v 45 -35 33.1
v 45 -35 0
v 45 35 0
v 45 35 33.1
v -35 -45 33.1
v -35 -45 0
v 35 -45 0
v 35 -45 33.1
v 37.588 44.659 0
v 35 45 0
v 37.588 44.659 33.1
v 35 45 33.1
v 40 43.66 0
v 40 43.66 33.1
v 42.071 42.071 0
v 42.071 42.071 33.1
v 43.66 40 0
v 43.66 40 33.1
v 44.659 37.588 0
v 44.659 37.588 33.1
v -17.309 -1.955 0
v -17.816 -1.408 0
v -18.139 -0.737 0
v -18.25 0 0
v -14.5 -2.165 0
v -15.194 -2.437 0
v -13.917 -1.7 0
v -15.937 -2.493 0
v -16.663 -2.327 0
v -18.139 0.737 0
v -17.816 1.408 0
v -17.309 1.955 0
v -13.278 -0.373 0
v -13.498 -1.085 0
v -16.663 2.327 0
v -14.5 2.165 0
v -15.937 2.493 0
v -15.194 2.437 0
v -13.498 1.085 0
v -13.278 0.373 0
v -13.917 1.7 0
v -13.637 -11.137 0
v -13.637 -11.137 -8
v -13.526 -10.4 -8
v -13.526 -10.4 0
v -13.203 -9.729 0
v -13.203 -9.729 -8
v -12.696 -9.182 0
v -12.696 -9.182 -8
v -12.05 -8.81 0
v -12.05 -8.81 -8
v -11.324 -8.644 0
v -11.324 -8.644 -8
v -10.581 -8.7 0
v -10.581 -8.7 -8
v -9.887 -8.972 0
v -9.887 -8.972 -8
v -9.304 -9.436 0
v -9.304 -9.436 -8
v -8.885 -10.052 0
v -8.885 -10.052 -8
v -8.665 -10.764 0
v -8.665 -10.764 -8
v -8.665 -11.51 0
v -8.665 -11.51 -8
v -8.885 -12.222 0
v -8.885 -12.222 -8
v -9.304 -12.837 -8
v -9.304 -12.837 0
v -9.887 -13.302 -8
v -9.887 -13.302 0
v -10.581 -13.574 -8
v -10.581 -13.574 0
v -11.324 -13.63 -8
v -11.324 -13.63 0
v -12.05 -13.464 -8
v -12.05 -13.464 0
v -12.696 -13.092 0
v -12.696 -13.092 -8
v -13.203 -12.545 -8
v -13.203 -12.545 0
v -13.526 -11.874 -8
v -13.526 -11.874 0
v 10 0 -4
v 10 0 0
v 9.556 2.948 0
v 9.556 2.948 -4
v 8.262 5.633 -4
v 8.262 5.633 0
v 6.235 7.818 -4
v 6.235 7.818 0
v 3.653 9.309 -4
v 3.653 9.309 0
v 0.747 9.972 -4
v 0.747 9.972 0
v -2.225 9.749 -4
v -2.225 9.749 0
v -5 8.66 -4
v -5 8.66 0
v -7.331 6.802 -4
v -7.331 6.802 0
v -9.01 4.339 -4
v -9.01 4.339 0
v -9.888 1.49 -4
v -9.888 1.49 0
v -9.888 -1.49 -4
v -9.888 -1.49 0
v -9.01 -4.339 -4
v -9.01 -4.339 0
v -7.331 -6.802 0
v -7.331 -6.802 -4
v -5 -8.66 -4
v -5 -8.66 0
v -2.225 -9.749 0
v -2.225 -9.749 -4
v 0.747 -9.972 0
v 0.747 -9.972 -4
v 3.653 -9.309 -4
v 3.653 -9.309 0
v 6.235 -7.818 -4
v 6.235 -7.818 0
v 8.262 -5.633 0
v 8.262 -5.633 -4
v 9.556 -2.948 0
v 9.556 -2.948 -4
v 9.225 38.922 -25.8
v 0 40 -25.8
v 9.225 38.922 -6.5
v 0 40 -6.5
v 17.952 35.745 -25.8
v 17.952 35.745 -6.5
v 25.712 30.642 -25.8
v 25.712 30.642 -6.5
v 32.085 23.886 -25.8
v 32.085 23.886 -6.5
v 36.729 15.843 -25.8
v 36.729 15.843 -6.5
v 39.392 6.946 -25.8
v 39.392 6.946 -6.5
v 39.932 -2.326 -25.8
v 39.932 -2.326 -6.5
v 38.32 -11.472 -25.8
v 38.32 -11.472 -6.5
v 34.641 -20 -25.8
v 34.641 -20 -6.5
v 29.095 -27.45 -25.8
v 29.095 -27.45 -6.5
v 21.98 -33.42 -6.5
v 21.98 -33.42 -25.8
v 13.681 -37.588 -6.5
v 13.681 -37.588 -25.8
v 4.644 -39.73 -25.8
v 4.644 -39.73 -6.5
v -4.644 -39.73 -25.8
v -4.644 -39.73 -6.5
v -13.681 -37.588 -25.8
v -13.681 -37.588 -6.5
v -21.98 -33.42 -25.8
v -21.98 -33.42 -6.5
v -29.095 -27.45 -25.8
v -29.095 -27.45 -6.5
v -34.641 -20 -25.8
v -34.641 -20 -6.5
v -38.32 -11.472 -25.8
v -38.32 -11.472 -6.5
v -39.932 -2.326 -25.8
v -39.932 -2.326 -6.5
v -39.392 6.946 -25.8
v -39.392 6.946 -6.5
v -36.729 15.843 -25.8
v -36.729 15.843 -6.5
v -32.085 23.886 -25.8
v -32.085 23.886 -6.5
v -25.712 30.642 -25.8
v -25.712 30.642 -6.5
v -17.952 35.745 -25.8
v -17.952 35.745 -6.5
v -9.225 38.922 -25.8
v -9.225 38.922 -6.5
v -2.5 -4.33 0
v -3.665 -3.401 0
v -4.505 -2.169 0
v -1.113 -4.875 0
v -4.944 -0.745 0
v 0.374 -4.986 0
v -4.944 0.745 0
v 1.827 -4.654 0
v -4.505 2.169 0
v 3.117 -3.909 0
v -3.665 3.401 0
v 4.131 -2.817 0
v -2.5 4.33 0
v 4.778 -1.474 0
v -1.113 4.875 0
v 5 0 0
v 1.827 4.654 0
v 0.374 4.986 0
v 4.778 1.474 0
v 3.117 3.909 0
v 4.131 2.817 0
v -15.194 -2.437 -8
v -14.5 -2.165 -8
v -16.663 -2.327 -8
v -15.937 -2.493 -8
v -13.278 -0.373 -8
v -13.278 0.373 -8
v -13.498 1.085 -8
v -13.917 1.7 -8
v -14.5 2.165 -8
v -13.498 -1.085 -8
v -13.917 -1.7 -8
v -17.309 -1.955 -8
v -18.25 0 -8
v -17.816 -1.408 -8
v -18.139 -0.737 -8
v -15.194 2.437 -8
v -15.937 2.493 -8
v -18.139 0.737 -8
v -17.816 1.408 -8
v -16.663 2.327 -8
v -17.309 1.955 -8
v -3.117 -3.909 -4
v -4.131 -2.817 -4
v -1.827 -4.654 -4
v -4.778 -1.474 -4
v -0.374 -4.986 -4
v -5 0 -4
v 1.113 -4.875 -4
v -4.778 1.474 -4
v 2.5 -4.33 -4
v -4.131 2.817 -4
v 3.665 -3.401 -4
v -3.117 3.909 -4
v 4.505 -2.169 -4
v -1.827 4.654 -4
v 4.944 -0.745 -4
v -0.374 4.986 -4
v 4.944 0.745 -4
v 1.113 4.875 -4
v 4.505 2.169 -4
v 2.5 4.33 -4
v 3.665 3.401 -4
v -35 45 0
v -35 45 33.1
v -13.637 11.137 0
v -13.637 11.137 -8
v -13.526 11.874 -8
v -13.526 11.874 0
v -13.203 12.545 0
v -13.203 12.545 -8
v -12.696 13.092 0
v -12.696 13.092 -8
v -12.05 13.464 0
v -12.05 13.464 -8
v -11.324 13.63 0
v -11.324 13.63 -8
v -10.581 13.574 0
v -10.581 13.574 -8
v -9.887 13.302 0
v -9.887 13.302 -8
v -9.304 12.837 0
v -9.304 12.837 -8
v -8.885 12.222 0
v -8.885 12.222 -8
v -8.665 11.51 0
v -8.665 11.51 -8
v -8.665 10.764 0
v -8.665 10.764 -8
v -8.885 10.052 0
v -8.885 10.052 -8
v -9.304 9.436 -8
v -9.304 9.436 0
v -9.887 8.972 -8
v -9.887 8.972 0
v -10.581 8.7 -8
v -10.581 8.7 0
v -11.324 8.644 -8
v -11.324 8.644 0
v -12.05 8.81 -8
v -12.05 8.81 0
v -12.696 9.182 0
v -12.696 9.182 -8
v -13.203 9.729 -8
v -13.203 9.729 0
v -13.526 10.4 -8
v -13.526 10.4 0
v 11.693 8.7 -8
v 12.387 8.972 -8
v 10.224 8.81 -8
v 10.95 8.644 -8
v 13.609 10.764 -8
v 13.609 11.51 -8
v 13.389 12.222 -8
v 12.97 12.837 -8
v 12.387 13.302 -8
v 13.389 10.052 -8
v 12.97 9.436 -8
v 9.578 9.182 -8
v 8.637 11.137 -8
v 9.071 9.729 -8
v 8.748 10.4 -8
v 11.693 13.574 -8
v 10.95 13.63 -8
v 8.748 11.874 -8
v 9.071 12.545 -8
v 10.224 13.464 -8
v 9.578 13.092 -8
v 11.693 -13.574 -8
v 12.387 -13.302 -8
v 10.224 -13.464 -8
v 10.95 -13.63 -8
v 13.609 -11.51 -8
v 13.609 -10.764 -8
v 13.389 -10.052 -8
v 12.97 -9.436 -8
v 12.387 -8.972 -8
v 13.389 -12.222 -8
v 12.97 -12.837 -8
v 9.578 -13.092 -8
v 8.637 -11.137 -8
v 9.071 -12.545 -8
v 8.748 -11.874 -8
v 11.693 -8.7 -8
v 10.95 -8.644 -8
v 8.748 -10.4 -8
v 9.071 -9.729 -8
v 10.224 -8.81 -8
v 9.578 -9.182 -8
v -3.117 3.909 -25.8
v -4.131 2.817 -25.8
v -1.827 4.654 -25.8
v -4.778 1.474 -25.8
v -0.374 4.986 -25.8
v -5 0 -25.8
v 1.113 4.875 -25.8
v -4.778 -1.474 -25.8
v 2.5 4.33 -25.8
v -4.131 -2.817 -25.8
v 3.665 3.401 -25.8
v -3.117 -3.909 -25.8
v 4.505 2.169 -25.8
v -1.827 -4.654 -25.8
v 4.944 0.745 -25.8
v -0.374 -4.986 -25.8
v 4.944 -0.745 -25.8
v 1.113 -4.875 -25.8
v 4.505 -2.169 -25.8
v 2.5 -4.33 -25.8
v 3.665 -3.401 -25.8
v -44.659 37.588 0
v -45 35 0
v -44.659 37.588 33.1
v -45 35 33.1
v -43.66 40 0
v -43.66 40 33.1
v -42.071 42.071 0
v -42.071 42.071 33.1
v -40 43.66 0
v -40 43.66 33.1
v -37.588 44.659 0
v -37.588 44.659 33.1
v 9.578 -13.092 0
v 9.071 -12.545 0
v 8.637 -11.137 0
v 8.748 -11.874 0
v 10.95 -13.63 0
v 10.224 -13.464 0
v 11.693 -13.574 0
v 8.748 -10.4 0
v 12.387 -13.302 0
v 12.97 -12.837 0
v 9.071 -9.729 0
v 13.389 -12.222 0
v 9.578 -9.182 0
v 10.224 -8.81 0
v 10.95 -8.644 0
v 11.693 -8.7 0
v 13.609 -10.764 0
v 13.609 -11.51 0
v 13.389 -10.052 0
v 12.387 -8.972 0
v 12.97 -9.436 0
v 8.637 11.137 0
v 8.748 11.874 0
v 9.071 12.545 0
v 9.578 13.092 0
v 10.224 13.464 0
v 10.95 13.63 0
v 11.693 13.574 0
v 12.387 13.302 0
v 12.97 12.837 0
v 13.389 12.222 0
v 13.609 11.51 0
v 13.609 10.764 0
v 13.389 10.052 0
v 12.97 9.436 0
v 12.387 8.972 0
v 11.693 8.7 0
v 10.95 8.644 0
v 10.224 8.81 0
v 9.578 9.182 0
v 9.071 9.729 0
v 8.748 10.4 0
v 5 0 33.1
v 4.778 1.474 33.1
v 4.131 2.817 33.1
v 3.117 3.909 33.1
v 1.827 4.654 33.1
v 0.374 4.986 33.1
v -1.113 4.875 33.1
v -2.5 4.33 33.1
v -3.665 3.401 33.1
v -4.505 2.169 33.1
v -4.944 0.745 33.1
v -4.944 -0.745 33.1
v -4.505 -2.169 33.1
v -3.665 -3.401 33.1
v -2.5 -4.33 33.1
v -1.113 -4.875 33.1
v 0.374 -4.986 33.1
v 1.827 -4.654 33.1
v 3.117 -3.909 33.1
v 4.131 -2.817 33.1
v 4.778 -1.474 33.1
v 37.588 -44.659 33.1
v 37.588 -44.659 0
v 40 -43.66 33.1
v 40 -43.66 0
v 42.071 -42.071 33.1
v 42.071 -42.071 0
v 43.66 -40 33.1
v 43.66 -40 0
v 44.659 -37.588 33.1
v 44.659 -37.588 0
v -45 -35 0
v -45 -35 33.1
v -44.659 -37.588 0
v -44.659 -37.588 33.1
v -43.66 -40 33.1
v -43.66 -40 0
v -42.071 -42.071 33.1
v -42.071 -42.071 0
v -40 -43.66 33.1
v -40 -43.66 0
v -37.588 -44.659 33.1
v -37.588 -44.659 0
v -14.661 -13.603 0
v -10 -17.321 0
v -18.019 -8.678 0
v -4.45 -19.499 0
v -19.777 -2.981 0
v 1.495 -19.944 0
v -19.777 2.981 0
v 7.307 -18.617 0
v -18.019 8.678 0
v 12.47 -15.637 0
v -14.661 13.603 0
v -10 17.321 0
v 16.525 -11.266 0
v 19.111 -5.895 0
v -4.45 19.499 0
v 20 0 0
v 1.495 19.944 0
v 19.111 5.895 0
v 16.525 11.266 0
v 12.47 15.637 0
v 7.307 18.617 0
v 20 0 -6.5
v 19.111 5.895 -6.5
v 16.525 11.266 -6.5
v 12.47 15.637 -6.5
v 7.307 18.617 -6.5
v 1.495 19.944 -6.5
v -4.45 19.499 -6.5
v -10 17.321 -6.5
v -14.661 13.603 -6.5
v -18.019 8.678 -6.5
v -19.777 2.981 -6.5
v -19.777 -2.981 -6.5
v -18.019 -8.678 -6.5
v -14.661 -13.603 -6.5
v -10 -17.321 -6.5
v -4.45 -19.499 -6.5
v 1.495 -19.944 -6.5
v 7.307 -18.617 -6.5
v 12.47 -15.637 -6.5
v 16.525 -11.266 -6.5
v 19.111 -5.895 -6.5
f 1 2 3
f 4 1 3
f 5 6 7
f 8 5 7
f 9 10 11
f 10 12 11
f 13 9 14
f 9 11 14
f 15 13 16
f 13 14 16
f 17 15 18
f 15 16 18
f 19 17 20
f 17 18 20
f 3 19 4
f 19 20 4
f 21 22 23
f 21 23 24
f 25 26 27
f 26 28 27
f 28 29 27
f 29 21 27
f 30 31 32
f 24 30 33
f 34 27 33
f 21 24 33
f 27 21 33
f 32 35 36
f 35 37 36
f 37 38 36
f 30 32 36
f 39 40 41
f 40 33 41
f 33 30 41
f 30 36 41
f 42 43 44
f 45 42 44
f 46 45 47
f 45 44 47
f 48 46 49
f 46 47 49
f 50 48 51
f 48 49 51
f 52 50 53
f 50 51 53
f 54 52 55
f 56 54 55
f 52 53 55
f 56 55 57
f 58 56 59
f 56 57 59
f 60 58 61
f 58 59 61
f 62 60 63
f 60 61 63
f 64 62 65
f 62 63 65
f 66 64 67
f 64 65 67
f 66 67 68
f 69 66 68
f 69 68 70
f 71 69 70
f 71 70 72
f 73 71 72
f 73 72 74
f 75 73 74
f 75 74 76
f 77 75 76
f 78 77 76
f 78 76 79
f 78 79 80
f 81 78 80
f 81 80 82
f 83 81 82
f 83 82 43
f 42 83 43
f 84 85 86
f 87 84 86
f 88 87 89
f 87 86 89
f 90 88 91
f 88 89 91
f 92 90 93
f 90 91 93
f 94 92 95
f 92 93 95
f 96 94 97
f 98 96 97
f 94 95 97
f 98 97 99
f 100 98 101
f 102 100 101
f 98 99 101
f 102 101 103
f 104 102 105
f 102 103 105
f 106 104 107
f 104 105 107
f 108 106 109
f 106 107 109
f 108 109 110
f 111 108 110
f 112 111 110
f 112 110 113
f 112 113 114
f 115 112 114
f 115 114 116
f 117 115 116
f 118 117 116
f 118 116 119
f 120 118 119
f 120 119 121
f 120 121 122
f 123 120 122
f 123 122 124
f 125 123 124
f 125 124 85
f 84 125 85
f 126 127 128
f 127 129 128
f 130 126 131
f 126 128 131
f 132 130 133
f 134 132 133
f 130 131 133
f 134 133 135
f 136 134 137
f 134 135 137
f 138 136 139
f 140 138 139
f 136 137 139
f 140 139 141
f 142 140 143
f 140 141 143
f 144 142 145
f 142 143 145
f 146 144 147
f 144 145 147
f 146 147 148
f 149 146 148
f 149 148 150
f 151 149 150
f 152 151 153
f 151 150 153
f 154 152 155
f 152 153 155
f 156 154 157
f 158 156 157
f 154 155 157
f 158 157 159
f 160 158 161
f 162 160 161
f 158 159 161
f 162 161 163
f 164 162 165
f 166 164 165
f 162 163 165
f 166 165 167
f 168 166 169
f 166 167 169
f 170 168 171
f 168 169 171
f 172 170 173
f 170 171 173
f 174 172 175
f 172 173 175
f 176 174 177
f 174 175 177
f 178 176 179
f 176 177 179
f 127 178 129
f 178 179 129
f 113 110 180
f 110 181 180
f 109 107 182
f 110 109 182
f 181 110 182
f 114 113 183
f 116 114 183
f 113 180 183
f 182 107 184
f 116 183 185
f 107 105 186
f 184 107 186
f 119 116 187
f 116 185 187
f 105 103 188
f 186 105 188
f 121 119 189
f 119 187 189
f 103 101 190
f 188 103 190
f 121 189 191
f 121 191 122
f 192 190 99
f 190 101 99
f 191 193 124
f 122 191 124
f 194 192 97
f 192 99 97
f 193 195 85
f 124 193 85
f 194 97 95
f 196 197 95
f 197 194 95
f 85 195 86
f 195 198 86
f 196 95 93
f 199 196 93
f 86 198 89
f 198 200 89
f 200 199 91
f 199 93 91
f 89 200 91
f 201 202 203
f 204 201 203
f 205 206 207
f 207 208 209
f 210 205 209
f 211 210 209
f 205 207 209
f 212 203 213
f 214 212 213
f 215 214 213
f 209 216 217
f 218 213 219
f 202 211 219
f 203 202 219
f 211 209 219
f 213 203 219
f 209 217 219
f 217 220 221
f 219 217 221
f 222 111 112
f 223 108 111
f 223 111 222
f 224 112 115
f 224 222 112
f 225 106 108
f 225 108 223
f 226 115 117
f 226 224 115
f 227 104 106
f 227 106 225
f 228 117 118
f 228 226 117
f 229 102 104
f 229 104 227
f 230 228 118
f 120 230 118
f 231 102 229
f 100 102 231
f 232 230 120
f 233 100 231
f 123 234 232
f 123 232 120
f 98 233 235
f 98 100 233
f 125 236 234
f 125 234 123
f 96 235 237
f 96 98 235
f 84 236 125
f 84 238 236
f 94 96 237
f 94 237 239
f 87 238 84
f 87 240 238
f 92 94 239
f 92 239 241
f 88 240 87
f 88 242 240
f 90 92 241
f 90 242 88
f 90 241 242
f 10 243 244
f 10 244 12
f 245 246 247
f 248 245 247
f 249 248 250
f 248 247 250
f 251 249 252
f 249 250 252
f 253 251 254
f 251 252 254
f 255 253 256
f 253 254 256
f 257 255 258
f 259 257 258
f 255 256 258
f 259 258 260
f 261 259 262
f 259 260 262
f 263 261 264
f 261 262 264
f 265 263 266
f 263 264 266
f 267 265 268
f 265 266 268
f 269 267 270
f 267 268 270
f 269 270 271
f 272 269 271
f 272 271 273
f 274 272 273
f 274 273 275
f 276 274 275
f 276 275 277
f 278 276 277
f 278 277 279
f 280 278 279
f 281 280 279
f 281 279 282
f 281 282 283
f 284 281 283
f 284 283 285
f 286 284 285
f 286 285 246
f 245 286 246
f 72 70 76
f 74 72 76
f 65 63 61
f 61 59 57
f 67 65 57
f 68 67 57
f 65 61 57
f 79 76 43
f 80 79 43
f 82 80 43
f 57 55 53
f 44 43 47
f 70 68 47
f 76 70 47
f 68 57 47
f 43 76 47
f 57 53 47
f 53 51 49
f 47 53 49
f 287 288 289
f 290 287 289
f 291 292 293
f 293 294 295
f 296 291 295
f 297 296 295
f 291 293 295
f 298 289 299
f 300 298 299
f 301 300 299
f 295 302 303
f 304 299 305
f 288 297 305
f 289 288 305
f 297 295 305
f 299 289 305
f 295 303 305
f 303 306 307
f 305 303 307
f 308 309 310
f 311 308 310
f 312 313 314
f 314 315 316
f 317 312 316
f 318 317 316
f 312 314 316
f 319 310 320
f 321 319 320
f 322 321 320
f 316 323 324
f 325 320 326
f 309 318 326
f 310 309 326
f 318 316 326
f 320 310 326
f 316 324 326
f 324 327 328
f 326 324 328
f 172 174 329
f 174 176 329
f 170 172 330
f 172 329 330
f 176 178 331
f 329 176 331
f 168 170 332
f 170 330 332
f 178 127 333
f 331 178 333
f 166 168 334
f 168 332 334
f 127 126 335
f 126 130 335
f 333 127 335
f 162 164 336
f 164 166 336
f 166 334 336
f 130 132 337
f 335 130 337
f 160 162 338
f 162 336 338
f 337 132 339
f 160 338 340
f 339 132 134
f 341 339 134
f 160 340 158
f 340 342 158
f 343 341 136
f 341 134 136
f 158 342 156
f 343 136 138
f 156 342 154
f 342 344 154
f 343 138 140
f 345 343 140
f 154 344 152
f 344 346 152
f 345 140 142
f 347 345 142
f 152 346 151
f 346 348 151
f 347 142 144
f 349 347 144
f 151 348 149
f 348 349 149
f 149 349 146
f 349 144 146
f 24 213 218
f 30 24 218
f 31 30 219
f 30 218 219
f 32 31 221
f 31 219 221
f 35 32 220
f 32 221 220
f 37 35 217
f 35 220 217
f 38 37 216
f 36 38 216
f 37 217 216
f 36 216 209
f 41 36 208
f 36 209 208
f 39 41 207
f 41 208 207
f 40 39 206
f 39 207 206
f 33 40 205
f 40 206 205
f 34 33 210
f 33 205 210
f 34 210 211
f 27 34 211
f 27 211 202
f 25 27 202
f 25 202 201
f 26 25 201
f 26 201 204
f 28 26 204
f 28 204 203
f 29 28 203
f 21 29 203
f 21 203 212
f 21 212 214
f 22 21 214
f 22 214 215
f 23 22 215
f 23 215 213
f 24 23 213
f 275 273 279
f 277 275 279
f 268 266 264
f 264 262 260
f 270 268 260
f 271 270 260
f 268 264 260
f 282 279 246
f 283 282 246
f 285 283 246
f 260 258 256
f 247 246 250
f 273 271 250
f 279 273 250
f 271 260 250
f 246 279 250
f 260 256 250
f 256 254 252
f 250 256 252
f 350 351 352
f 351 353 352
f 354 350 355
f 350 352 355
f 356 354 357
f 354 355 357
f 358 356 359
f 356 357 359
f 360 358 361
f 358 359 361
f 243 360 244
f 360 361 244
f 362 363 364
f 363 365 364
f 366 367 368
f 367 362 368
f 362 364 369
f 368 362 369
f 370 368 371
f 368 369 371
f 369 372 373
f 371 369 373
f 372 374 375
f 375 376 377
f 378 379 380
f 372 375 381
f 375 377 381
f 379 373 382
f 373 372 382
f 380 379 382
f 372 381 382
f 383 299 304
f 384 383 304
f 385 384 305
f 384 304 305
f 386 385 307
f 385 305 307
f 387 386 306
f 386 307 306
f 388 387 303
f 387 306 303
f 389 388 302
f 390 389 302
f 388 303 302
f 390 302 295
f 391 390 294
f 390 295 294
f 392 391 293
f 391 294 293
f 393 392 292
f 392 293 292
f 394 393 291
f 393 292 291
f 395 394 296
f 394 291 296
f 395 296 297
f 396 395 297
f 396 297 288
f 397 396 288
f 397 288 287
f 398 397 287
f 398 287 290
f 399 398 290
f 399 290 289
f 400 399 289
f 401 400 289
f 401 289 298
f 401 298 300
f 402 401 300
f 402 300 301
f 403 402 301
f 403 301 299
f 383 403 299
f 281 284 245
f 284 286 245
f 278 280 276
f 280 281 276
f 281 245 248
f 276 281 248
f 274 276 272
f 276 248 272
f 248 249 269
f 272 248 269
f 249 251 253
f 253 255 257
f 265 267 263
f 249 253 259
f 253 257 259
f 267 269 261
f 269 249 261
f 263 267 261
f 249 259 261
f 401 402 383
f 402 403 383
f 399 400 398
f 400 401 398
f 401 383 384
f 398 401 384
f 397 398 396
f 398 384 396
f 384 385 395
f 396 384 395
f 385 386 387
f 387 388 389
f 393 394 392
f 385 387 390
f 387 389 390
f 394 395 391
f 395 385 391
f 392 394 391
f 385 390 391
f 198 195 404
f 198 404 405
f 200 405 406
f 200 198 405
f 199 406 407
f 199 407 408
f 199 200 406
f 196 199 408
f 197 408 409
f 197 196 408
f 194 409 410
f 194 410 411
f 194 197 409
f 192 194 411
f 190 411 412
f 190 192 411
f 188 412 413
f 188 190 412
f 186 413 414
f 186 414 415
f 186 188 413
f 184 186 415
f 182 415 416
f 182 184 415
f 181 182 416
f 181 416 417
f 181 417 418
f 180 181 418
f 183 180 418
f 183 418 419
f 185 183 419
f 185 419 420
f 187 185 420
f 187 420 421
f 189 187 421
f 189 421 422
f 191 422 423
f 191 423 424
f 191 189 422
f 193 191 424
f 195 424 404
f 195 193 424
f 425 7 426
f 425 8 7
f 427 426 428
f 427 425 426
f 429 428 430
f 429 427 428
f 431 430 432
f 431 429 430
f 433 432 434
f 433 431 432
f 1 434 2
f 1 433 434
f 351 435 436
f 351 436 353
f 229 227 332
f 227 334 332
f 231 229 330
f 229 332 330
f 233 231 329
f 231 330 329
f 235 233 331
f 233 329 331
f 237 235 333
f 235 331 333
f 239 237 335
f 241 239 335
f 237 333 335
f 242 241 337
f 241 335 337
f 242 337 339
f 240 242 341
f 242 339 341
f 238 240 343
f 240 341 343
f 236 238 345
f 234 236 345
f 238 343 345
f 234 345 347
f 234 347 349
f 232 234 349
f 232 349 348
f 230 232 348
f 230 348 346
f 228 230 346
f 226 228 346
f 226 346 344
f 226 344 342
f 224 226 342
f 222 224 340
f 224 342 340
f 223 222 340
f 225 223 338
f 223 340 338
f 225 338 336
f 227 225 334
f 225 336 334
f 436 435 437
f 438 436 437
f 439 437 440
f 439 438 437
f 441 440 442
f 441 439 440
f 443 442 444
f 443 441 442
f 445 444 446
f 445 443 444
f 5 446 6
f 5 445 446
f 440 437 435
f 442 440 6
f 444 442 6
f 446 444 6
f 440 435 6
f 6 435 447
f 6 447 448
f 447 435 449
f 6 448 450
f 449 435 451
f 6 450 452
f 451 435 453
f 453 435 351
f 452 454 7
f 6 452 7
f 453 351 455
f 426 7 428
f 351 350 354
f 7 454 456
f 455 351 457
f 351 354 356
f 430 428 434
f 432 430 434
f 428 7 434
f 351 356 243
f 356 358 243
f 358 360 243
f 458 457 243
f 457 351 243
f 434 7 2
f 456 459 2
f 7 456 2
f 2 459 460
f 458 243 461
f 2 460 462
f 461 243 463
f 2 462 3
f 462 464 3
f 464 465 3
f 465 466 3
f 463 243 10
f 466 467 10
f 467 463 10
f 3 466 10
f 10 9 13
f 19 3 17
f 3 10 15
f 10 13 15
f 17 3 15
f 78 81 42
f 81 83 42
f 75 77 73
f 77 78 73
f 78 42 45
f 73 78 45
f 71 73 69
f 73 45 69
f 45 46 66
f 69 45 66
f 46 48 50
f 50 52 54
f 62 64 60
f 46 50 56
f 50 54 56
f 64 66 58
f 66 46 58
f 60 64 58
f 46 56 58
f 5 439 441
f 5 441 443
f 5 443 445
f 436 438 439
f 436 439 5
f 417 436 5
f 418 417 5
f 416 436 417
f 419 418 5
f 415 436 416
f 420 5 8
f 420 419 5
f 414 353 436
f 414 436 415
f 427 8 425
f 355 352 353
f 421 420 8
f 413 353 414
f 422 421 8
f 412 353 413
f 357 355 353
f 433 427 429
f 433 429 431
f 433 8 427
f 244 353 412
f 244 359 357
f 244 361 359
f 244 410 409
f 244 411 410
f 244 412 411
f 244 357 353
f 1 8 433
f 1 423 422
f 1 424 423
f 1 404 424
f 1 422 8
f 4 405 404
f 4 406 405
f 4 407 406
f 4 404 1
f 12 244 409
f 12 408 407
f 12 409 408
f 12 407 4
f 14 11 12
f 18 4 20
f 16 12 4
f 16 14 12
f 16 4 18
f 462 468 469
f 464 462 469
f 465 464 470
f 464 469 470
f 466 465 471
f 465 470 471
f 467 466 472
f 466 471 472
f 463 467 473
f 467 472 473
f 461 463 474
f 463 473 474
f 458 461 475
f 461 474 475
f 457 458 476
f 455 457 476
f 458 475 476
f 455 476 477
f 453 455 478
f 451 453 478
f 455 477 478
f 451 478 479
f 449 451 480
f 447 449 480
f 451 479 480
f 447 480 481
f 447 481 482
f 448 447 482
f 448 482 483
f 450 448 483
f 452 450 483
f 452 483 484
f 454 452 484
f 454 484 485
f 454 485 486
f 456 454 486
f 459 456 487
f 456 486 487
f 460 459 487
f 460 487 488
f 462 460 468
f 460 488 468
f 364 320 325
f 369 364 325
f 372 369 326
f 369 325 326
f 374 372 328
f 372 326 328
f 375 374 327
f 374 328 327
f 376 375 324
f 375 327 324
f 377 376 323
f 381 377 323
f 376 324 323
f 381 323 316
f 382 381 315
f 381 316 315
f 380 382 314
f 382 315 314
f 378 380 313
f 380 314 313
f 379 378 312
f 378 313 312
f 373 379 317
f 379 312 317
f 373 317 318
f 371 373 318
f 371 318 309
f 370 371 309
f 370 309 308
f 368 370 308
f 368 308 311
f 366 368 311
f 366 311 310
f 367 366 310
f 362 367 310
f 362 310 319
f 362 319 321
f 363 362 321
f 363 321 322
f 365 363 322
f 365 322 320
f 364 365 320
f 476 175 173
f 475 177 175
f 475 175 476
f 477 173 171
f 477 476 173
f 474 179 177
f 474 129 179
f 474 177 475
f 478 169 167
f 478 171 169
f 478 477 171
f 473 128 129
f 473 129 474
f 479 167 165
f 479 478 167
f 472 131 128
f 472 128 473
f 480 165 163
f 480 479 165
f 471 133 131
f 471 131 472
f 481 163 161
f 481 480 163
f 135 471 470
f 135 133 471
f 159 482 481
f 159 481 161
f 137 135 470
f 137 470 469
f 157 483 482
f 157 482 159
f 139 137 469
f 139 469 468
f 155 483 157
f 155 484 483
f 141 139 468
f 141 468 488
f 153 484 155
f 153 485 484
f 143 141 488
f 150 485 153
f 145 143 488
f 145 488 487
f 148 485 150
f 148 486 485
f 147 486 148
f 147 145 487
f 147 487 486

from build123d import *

# Parameters (mm, degrees)
SKETCH1_W                               = 40
SKETCH1_H                               = 19.3
SKETCH2_R                               = 20
BOSS_EXTRUDE1_DEPTH                     = 6.5
CBORE_FOR_M8_HEX_HEAD_BOLT1_D           = 10
CBORE_FOR_M8_HEX_HEAD_BOLT1_CBORE_D     = 20
CBORE_FOR_M8_HEX_HEAD_BOLT1_CBORE_DEPTH = 4
F_5_0_5_DIAMETER_HOLE1_D                = 5
F_5_0_5_DIAMETER_HOLE1_DEPTH            = 8
SKETCH7_W                               = 90
SKETCH7_H                               = 90
SKETCH7_R                               = 5
BOSS_EXTRUDE2_DEPTH                     = 33.1
FILLET1_R                               = 10


with BuildPart() as part:
    # Sketch1 → Revolve1 (revolve)
    with BuildSketch(Plane.XZ, mode=Mode.PRIVATE) as revolve1_sk:
        with Locations((20, -16.15)):
            Rectangle(SKETCH1_W, SKETCH1_H)
    revolve(revolve1_sk.sketch.rotate(Axis((0, 0, -6.5), (0, 0, -1)), 270), axis=Axis((0, 0, -6.5), (0, 0, -1)))

    # Sketch2 → Boss-Extrude1 (add)
    with BuildSketch(Plane.XY.offset(-6.5)):
        Circle(SKETCH2_R)
    extrude(amount=BOSS_EXTRUDE1_DEPTH)

    # CBORE for M8 Hex Head Bolt1 (through all)
    with Locations(Plane.XY):
        with Locations((0, 0)):
            CounterBoreHole(CBORE_FOR_M8_HEX_HEAD_BOLT1_D / 2, CBORE_FOR_M8_HEX_HEAD_BOLT1_CBORE_D / 2, CBORE_FOR_M8_HEX_HEAD_BOLT1_CBORE_DEPTH)

    # Ø5.0 (5) Diameter Hole1
    with Locations(Plane.XY):
        with Locations((-15.75, 0), (-11.136931804, 11.136931804), (-11.136931804, -11.136931804), (11.136931804, -11.136931804), (11.136931804, 11.136931804)):
            Hole(F_5_0_5_DIAMETER_HOLE1_D / 2, depth=F_5_0_5_DIAMETER_HOLE1_DEPTH)

    # Sketch7 → Boss-Extrude2 (add)
    with BuildSketch(Plane.XY):
        Rectangle(SKETCH7_W, SKETCH7_H)
        Circle(SKETCH7_R, mode=Mode.SUBTRACT)
    extrude(amount=BOSS_EXTRUDE2_DEPTH)

    # Fillet1
    fillet1_edges = [part.edges().sort_by_distance(p)[0] for p in [
        (45, -45, 16.55),
        (45, 45, 16.55),
        (-45, 45, 16.55),
        (-45, -45, 16.55),
    ]]
    fillet(fillet1_edges, radius=FILLET1_R)


solid = part.part
